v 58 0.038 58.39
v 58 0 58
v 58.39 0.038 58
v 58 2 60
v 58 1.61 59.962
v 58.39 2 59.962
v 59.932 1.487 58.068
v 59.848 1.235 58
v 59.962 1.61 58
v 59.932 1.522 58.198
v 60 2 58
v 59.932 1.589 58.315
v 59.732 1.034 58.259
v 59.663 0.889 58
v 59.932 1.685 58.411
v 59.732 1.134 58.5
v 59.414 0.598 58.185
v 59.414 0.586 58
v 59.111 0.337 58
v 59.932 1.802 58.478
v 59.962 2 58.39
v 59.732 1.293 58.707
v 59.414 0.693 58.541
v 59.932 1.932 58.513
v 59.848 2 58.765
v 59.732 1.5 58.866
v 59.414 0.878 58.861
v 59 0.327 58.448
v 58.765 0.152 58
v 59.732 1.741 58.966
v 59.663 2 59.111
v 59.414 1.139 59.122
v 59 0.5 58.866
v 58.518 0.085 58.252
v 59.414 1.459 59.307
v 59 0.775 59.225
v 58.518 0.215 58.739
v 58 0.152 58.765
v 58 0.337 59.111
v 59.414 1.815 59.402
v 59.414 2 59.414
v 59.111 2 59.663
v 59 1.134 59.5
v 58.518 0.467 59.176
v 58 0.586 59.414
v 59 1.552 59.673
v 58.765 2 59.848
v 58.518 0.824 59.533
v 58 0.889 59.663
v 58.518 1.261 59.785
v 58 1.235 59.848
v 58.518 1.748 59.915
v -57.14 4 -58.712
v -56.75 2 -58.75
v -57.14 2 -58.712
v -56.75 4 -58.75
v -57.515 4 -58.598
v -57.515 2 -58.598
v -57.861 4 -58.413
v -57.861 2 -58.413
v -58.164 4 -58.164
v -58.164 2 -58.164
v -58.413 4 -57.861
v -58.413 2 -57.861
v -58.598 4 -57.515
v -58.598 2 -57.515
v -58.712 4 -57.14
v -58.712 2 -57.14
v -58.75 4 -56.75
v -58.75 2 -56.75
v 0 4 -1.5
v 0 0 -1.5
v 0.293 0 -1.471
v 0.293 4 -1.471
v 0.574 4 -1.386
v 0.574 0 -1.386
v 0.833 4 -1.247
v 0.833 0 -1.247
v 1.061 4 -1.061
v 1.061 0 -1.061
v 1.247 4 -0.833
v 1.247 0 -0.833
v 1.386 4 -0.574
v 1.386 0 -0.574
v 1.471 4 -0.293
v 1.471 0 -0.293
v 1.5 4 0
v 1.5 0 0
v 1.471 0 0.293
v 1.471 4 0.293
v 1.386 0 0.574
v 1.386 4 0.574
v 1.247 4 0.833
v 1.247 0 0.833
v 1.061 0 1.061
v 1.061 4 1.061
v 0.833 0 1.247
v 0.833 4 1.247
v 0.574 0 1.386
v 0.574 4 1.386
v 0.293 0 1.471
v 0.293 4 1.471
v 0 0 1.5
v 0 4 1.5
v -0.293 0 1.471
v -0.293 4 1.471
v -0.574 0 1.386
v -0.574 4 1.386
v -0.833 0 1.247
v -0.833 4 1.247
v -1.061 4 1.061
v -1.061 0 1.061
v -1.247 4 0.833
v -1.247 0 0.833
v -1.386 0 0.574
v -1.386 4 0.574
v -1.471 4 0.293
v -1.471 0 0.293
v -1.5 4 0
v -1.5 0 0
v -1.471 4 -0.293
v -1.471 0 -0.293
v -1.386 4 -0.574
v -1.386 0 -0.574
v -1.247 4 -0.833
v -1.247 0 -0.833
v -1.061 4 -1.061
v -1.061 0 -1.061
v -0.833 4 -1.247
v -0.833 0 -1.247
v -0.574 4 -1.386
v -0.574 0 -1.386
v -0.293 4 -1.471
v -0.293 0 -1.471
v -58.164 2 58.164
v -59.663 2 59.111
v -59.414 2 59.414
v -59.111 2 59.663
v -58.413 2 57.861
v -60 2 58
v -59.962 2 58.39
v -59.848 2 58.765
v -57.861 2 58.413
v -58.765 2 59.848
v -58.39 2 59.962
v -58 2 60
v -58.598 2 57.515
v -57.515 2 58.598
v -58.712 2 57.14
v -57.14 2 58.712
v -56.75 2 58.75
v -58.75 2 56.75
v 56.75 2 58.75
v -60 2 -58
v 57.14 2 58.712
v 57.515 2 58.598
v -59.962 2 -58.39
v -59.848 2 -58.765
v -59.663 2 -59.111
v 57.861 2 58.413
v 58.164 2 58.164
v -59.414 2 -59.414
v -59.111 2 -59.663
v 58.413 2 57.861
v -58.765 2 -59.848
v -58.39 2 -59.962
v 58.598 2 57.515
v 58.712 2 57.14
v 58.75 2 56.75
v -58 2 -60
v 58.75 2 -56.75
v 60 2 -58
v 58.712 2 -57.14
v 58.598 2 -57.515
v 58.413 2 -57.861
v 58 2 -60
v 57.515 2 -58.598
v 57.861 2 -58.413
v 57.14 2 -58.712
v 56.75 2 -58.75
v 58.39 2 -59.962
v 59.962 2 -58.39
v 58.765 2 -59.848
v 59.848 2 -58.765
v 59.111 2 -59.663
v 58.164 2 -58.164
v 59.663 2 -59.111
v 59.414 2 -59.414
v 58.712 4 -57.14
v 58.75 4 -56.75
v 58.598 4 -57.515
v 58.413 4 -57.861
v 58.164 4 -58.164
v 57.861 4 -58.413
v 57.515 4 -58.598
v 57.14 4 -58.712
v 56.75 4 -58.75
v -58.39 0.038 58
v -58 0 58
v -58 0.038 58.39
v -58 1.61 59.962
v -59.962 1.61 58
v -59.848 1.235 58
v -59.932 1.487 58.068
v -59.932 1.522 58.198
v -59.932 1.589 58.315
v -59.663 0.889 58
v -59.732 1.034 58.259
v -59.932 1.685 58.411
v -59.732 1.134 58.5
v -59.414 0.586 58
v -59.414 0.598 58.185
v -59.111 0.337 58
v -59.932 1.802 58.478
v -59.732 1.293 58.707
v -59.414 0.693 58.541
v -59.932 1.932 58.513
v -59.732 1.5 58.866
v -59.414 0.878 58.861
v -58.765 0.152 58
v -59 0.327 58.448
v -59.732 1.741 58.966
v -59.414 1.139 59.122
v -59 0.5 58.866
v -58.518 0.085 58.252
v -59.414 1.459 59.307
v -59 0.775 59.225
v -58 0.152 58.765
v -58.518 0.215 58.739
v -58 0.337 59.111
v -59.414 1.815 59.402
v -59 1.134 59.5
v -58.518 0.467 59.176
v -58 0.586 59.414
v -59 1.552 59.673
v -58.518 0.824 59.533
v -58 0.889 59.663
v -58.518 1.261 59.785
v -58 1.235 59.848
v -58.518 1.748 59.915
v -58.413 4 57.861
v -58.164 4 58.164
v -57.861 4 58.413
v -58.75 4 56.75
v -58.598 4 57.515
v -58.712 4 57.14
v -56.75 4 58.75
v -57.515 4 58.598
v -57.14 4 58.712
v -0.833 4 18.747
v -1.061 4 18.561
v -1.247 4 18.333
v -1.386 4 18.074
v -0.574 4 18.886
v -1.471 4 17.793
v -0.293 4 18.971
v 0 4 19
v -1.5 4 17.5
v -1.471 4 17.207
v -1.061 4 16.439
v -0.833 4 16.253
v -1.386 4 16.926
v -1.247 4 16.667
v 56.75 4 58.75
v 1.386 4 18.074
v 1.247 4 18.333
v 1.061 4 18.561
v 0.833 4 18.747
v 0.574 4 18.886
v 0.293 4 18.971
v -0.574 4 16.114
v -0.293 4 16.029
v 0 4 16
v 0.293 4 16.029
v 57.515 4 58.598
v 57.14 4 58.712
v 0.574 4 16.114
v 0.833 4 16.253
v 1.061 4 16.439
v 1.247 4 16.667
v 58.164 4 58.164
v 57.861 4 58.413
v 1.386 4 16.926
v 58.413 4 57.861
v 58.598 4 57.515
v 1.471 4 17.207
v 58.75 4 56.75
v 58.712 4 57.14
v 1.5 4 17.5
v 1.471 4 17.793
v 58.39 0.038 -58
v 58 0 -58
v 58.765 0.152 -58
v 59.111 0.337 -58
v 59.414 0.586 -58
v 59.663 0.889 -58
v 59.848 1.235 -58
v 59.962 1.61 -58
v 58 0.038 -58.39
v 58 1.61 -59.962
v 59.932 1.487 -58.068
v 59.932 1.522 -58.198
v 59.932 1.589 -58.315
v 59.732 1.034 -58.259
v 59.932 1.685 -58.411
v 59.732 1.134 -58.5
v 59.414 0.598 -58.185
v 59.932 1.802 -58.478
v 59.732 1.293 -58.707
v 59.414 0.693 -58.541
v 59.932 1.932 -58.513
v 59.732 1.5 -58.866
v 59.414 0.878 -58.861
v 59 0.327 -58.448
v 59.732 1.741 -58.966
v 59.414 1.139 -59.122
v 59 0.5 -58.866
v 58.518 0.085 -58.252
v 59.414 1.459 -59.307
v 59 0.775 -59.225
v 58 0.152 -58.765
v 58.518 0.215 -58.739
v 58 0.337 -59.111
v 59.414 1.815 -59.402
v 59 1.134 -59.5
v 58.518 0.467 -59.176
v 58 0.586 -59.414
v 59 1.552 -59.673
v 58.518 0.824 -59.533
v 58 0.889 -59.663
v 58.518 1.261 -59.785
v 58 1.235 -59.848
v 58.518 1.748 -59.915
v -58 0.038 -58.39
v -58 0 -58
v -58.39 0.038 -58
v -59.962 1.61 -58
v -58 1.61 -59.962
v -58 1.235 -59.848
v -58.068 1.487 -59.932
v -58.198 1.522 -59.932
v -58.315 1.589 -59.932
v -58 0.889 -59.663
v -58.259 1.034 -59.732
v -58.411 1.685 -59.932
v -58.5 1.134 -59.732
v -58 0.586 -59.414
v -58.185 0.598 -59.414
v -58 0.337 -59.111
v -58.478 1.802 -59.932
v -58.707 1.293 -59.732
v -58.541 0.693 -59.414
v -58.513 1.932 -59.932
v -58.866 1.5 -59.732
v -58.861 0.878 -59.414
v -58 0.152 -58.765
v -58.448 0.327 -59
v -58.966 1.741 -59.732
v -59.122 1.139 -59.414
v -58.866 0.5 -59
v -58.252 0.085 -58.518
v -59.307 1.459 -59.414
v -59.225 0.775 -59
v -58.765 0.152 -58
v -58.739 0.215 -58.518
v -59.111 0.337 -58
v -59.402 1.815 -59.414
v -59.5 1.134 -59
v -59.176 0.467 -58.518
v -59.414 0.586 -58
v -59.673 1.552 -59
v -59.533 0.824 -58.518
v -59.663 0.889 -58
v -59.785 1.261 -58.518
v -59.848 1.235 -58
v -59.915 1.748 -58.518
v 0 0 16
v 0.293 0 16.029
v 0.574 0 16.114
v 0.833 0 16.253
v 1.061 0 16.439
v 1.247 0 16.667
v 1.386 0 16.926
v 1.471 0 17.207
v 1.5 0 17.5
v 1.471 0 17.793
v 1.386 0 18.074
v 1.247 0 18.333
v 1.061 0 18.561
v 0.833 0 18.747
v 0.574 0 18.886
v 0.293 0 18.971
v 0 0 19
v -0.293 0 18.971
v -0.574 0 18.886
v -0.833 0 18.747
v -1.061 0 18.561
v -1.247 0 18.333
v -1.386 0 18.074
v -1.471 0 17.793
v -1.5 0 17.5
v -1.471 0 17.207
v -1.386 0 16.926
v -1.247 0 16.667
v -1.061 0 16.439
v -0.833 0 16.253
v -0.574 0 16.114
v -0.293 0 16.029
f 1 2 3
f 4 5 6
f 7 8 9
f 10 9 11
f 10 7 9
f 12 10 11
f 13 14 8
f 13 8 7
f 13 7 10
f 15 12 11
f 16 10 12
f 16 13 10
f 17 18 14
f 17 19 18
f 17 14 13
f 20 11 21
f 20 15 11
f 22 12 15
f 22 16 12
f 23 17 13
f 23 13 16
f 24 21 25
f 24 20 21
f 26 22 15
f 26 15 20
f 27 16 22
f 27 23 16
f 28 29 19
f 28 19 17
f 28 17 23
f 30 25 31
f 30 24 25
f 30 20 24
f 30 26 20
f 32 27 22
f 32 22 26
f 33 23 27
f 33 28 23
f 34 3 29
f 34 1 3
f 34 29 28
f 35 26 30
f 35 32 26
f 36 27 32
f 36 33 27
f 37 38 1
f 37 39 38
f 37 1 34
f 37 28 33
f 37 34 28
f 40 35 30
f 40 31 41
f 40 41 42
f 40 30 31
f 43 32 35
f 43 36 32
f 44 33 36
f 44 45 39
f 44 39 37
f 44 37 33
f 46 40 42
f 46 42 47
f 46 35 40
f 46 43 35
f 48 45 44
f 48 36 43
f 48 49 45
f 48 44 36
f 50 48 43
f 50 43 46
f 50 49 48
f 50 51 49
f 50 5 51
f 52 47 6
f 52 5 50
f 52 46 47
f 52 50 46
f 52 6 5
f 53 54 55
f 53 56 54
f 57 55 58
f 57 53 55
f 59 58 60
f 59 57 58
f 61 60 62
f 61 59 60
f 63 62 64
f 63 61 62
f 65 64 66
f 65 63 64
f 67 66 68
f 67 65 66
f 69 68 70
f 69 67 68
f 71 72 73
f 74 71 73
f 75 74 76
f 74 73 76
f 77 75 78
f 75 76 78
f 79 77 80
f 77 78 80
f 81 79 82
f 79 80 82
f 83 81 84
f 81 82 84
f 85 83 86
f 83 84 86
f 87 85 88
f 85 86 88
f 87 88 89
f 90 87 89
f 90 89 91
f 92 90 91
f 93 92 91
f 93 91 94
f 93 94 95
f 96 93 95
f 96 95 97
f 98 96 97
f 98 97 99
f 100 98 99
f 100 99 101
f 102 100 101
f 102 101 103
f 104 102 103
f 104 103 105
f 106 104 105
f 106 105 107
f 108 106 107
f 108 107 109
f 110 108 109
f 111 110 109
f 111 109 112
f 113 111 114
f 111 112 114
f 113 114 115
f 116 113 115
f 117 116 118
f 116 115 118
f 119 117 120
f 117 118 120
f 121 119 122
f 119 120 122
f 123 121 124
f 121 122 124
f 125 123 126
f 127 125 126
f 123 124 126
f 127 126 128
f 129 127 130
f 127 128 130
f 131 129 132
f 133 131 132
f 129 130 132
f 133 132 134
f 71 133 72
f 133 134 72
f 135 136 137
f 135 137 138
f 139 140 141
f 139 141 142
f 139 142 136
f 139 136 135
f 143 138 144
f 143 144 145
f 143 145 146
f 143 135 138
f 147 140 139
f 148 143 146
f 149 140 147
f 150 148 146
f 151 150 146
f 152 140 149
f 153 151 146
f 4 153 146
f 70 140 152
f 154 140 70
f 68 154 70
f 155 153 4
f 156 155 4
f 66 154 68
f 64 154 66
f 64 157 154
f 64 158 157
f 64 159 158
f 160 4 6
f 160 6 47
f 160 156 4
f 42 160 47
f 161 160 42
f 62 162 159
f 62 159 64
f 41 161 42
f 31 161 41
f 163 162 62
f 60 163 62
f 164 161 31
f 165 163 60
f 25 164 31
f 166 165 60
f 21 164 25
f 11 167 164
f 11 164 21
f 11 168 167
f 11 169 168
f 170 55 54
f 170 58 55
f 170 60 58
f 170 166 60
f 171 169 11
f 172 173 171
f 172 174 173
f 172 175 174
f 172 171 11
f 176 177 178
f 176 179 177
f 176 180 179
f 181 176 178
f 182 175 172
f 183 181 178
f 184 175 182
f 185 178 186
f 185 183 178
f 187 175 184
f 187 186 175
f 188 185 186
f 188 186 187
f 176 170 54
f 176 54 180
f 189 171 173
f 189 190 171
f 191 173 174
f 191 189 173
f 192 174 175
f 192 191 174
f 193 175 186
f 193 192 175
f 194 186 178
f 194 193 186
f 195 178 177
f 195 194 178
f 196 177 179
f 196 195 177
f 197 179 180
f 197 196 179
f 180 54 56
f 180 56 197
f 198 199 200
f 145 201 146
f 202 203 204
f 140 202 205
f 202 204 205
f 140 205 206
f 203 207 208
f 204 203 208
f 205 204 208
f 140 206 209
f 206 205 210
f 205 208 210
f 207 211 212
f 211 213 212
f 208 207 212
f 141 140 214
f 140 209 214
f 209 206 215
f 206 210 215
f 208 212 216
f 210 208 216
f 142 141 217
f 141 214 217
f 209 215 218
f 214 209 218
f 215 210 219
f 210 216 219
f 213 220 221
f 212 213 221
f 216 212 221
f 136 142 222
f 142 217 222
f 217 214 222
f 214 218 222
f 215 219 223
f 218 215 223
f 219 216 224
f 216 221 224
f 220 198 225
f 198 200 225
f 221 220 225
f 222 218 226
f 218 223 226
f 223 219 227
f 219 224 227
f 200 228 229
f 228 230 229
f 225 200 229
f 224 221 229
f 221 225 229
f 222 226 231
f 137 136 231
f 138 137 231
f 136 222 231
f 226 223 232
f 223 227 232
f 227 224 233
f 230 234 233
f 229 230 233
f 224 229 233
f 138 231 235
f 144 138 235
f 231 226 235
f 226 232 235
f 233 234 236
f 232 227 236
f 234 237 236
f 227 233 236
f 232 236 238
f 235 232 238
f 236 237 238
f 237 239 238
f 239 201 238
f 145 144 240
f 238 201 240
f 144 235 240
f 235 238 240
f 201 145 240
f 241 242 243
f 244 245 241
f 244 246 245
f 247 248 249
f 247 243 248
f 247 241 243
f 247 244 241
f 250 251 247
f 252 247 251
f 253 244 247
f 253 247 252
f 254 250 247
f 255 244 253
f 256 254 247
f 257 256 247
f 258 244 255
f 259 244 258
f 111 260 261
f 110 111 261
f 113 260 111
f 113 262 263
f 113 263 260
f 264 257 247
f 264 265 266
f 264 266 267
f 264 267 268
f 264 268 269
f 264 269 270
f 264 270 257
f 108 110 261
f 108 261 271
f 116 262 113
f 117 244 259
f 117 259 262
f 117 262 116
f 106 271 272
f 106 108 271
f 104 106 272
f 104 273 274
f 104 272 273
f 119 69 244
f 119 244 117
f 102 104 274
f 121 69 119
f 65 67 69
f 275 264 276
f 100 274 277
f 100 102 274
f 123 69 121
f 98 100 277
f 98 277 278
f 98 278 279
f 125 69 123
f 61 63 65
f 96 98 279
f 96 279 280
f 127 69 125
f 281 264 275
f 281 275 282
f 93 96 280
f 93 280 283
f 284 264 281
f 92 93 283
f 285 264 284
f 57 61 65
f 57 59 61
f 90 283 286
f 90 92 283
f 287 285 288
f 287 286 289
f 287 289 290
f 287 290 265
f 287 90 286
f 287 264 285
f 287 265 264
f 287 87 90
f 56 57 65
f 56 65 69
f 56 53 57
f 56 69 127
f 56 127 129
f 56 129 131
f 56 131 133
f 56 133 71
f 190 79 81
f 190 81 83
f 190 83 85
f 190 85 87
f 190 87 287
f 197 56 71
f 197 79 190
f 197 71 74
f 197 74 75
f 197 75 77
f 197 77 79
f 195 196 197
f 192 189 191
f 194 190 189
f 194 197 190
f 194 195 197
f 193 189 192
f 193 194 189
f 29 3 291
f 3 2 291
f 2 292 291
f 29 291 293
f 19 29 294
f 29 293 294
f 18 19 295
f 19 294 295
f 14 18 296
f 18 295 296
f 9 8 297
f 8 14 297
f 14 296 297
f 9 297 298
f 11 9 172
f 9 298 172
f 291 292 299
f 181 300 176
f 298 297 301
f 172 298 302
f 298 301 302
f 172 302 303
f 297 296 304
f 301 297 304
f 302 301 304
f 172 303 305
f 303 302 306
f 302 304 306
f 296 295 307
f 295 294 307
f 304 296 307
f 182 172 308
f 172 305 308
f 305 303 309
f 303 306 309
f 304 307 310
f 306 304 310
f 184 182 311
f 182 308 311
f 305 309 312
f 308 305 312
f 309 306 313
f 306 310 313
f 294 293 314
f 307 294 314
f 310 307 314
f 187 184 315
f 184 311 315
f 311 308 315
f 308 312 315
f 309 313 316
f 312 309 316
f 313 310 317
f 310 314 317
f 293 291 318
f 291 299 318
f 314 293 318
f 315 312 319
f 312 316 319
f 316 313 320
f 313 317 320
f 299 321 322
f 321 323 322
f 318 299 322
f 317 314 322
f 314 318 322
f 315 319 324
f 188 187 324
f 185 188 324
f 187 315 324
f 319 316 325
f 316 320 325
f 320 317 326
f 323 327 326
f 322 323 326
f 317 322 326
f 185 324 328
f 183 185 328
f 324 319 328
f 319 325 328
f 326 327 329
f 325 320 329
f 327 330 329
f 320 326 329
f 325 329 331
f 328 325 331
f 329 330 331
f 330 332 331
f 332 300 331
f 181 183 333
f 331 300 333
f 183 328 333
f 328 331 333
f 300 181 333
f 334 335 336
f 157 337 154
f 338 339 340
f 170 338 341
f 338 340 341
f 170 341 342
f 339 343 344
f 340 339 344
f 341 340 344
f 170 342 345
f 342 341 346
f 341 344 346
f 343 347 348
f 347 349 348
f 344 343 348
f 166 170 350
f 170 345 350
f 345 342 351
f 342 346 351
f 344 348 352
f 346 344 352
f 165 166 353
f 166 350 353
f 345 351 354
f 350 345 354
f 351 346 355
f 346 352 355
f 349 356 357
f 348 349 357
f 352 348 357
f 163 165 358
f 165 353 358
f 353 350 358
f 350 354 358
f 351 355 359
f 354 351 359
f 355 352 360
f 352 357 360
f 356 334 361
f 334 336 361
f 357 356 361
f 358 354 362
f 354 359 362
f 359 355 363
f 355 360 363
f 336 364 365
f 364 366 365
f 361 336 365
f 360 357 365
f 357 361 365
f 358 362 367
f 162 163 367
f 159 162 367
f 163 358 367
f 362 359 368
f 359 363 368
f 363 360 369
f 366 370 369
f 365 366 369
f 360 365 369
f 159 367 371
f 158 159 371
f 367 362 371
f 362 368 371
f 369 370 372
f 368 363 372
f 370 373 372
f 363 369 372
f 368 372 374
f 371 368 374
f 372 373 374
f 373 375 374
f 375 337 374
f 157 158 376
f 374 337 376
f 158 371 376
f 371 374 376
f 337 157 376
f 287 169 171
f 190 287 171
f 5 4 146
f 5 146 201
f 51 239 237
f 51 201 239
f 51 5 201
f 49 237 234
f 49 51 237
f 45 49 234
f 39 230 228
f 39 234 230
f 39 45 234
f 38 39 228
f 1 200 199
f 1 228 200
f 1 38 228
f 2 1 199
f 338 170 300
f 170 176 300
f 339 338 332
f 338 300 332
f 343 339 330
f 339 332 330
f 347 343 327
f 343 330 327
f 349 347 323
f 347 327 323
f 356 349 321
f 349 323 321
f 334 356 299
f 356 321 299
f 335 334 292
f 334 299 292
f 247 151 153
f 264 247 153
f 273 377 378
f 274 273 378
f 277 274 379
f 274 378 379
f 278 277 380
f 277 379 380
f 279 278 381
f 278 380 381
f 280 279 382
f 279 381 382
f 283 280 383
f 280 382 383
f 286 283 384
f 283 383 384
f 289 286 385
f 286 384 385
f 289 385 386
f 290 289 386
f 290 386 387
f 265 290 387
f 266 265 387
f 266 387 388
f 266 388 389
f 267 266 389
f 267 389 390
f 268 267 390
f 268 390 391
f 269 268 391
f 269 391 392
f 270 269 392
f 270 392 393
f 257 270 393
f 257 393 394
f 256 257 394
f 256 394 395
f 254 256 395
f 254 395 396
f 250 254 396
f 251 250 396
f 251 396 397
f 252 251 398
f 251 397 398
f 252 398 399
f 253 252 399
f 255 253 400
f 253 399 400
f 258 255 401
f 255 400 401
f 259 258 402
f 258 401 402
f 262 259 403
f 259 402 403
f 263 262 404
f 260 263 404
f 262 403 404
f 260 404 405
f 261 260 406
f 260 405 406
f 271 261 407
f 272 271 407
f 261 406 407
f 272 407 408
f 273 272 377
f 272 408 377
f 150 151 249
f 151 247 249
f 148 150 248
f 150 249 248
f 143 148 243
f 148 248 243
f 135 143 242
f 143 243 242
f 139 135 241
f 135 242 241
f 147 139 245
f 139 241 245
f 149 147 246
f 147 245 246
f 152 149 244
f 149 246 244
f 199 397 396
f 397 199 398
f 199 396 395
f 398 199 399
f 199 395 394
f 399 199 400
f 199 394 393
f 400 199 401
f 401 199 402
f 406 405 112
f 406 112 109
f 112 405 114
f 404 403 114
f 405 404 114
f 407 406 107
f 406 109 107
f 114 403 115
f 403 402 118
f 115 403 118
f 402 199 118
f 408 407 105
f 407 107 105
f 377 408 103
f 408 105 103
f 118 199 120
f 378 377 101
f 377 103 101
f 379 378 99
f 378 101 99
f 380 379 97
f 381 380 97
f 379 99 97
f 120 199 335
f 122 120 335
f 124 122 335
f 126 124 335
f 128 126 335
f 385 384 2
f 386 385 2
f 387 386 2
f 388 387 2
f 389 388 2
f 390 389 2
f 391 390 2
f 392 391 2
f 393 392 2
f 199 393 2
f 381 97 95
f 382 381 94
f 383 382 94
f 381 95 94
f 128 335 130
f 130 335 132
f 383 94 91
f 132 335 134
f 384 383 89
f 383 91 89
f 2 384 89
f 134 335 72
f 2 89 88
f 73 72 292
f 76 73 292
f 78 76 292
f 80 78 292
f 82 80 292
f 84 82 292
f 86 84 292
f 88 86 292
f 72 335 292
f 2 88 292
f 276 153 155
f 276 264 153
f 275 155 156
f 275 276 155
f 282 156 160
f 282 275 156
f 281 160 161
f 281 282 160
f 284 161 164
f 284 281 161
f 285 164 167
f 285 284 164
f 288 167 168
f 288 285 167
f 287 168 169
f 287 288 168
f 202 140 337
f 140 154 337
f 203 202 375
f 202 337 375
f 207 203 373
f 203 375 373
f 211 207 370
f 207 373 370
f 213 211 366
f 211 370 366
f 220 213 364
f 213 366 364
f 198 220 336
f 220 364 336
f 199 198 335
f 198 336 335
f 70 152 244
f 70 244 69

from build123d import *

# Parameters (mm, degrees)
SKETCH1_W           = 120
SKETCH1_H           = 120
BOSS_EXTRUDE1_DEPTH = 2
SKETCH2_W           = 117.5
SKETCH2_H           = 117.5
BOSS_EXTRUDE2_DEPTH = 2
FILLET1_R           = 2
SKETCH4_R           = 1.5
CUT_EXTRUDE1_DEPTH  = 85.947042326


with BuildPart() as part:
    # Sketch1 → Boss-Extrude1 (new body)
    with BuildSketch(Plane(origin=(0, 0, 0), x_dir=(1, 0, 0), z_dir=(0, 1, 0))):
        Rectangle(SKETCH1_W, SKETCH1_H)
    extrude(amount=BOSS_EXTRUDE1_DEPTH)

    # Sketch2 → Boss-Extrude2 (add)
    with BuildSketch(Plane(origin=(0, 2, 0), x_dir=(1, 0, 0), z_dir=(0, 1, 0))):
        Rectangle(SKETCH2_W, SKETCH2_H)
    extrude(amount=BOSS_EXTRUDE2_DEPTH)

    # Fillet1
    fillet1_edges = [part.edges().sort_by_distance(p)[0] for p in [
        (58.75, 3, 58.75),
        (58.75, 3, -58.75),
        (-58.75, 3, -58.75),
        (-58.75, 3, 58.75),
        (0, 0, 60),
        (-60, 0, 0),
        (0, 0, -60),
        (60, 0, 0),
        (60, 1, 60),
        (-60, 1, 60),
        (-60, 1, -60),
        (60, 1, -60),
    ]]
    fillet(fillet1_edges, radius=FILLET1_R - 0.0001)  # a hair under: the kernel refuses the full size

    # Sketch4 → Cut-Extrude1 (cut, through all)
    with BuildSketch(Plane.XZ):
        with Locations(Location((0, 0, 0), (0, 0, 270))):
            Circle(SKETCH4_R)
        with Locations(Location((0, 17.5, 0), (0, 0, 270))):
            Circle(SKETCH4_R)
    extrude(amount=-CUT_EXTRUDE1_DEPTH, mode=Mode.SUBTRACT)


solid = part.part
